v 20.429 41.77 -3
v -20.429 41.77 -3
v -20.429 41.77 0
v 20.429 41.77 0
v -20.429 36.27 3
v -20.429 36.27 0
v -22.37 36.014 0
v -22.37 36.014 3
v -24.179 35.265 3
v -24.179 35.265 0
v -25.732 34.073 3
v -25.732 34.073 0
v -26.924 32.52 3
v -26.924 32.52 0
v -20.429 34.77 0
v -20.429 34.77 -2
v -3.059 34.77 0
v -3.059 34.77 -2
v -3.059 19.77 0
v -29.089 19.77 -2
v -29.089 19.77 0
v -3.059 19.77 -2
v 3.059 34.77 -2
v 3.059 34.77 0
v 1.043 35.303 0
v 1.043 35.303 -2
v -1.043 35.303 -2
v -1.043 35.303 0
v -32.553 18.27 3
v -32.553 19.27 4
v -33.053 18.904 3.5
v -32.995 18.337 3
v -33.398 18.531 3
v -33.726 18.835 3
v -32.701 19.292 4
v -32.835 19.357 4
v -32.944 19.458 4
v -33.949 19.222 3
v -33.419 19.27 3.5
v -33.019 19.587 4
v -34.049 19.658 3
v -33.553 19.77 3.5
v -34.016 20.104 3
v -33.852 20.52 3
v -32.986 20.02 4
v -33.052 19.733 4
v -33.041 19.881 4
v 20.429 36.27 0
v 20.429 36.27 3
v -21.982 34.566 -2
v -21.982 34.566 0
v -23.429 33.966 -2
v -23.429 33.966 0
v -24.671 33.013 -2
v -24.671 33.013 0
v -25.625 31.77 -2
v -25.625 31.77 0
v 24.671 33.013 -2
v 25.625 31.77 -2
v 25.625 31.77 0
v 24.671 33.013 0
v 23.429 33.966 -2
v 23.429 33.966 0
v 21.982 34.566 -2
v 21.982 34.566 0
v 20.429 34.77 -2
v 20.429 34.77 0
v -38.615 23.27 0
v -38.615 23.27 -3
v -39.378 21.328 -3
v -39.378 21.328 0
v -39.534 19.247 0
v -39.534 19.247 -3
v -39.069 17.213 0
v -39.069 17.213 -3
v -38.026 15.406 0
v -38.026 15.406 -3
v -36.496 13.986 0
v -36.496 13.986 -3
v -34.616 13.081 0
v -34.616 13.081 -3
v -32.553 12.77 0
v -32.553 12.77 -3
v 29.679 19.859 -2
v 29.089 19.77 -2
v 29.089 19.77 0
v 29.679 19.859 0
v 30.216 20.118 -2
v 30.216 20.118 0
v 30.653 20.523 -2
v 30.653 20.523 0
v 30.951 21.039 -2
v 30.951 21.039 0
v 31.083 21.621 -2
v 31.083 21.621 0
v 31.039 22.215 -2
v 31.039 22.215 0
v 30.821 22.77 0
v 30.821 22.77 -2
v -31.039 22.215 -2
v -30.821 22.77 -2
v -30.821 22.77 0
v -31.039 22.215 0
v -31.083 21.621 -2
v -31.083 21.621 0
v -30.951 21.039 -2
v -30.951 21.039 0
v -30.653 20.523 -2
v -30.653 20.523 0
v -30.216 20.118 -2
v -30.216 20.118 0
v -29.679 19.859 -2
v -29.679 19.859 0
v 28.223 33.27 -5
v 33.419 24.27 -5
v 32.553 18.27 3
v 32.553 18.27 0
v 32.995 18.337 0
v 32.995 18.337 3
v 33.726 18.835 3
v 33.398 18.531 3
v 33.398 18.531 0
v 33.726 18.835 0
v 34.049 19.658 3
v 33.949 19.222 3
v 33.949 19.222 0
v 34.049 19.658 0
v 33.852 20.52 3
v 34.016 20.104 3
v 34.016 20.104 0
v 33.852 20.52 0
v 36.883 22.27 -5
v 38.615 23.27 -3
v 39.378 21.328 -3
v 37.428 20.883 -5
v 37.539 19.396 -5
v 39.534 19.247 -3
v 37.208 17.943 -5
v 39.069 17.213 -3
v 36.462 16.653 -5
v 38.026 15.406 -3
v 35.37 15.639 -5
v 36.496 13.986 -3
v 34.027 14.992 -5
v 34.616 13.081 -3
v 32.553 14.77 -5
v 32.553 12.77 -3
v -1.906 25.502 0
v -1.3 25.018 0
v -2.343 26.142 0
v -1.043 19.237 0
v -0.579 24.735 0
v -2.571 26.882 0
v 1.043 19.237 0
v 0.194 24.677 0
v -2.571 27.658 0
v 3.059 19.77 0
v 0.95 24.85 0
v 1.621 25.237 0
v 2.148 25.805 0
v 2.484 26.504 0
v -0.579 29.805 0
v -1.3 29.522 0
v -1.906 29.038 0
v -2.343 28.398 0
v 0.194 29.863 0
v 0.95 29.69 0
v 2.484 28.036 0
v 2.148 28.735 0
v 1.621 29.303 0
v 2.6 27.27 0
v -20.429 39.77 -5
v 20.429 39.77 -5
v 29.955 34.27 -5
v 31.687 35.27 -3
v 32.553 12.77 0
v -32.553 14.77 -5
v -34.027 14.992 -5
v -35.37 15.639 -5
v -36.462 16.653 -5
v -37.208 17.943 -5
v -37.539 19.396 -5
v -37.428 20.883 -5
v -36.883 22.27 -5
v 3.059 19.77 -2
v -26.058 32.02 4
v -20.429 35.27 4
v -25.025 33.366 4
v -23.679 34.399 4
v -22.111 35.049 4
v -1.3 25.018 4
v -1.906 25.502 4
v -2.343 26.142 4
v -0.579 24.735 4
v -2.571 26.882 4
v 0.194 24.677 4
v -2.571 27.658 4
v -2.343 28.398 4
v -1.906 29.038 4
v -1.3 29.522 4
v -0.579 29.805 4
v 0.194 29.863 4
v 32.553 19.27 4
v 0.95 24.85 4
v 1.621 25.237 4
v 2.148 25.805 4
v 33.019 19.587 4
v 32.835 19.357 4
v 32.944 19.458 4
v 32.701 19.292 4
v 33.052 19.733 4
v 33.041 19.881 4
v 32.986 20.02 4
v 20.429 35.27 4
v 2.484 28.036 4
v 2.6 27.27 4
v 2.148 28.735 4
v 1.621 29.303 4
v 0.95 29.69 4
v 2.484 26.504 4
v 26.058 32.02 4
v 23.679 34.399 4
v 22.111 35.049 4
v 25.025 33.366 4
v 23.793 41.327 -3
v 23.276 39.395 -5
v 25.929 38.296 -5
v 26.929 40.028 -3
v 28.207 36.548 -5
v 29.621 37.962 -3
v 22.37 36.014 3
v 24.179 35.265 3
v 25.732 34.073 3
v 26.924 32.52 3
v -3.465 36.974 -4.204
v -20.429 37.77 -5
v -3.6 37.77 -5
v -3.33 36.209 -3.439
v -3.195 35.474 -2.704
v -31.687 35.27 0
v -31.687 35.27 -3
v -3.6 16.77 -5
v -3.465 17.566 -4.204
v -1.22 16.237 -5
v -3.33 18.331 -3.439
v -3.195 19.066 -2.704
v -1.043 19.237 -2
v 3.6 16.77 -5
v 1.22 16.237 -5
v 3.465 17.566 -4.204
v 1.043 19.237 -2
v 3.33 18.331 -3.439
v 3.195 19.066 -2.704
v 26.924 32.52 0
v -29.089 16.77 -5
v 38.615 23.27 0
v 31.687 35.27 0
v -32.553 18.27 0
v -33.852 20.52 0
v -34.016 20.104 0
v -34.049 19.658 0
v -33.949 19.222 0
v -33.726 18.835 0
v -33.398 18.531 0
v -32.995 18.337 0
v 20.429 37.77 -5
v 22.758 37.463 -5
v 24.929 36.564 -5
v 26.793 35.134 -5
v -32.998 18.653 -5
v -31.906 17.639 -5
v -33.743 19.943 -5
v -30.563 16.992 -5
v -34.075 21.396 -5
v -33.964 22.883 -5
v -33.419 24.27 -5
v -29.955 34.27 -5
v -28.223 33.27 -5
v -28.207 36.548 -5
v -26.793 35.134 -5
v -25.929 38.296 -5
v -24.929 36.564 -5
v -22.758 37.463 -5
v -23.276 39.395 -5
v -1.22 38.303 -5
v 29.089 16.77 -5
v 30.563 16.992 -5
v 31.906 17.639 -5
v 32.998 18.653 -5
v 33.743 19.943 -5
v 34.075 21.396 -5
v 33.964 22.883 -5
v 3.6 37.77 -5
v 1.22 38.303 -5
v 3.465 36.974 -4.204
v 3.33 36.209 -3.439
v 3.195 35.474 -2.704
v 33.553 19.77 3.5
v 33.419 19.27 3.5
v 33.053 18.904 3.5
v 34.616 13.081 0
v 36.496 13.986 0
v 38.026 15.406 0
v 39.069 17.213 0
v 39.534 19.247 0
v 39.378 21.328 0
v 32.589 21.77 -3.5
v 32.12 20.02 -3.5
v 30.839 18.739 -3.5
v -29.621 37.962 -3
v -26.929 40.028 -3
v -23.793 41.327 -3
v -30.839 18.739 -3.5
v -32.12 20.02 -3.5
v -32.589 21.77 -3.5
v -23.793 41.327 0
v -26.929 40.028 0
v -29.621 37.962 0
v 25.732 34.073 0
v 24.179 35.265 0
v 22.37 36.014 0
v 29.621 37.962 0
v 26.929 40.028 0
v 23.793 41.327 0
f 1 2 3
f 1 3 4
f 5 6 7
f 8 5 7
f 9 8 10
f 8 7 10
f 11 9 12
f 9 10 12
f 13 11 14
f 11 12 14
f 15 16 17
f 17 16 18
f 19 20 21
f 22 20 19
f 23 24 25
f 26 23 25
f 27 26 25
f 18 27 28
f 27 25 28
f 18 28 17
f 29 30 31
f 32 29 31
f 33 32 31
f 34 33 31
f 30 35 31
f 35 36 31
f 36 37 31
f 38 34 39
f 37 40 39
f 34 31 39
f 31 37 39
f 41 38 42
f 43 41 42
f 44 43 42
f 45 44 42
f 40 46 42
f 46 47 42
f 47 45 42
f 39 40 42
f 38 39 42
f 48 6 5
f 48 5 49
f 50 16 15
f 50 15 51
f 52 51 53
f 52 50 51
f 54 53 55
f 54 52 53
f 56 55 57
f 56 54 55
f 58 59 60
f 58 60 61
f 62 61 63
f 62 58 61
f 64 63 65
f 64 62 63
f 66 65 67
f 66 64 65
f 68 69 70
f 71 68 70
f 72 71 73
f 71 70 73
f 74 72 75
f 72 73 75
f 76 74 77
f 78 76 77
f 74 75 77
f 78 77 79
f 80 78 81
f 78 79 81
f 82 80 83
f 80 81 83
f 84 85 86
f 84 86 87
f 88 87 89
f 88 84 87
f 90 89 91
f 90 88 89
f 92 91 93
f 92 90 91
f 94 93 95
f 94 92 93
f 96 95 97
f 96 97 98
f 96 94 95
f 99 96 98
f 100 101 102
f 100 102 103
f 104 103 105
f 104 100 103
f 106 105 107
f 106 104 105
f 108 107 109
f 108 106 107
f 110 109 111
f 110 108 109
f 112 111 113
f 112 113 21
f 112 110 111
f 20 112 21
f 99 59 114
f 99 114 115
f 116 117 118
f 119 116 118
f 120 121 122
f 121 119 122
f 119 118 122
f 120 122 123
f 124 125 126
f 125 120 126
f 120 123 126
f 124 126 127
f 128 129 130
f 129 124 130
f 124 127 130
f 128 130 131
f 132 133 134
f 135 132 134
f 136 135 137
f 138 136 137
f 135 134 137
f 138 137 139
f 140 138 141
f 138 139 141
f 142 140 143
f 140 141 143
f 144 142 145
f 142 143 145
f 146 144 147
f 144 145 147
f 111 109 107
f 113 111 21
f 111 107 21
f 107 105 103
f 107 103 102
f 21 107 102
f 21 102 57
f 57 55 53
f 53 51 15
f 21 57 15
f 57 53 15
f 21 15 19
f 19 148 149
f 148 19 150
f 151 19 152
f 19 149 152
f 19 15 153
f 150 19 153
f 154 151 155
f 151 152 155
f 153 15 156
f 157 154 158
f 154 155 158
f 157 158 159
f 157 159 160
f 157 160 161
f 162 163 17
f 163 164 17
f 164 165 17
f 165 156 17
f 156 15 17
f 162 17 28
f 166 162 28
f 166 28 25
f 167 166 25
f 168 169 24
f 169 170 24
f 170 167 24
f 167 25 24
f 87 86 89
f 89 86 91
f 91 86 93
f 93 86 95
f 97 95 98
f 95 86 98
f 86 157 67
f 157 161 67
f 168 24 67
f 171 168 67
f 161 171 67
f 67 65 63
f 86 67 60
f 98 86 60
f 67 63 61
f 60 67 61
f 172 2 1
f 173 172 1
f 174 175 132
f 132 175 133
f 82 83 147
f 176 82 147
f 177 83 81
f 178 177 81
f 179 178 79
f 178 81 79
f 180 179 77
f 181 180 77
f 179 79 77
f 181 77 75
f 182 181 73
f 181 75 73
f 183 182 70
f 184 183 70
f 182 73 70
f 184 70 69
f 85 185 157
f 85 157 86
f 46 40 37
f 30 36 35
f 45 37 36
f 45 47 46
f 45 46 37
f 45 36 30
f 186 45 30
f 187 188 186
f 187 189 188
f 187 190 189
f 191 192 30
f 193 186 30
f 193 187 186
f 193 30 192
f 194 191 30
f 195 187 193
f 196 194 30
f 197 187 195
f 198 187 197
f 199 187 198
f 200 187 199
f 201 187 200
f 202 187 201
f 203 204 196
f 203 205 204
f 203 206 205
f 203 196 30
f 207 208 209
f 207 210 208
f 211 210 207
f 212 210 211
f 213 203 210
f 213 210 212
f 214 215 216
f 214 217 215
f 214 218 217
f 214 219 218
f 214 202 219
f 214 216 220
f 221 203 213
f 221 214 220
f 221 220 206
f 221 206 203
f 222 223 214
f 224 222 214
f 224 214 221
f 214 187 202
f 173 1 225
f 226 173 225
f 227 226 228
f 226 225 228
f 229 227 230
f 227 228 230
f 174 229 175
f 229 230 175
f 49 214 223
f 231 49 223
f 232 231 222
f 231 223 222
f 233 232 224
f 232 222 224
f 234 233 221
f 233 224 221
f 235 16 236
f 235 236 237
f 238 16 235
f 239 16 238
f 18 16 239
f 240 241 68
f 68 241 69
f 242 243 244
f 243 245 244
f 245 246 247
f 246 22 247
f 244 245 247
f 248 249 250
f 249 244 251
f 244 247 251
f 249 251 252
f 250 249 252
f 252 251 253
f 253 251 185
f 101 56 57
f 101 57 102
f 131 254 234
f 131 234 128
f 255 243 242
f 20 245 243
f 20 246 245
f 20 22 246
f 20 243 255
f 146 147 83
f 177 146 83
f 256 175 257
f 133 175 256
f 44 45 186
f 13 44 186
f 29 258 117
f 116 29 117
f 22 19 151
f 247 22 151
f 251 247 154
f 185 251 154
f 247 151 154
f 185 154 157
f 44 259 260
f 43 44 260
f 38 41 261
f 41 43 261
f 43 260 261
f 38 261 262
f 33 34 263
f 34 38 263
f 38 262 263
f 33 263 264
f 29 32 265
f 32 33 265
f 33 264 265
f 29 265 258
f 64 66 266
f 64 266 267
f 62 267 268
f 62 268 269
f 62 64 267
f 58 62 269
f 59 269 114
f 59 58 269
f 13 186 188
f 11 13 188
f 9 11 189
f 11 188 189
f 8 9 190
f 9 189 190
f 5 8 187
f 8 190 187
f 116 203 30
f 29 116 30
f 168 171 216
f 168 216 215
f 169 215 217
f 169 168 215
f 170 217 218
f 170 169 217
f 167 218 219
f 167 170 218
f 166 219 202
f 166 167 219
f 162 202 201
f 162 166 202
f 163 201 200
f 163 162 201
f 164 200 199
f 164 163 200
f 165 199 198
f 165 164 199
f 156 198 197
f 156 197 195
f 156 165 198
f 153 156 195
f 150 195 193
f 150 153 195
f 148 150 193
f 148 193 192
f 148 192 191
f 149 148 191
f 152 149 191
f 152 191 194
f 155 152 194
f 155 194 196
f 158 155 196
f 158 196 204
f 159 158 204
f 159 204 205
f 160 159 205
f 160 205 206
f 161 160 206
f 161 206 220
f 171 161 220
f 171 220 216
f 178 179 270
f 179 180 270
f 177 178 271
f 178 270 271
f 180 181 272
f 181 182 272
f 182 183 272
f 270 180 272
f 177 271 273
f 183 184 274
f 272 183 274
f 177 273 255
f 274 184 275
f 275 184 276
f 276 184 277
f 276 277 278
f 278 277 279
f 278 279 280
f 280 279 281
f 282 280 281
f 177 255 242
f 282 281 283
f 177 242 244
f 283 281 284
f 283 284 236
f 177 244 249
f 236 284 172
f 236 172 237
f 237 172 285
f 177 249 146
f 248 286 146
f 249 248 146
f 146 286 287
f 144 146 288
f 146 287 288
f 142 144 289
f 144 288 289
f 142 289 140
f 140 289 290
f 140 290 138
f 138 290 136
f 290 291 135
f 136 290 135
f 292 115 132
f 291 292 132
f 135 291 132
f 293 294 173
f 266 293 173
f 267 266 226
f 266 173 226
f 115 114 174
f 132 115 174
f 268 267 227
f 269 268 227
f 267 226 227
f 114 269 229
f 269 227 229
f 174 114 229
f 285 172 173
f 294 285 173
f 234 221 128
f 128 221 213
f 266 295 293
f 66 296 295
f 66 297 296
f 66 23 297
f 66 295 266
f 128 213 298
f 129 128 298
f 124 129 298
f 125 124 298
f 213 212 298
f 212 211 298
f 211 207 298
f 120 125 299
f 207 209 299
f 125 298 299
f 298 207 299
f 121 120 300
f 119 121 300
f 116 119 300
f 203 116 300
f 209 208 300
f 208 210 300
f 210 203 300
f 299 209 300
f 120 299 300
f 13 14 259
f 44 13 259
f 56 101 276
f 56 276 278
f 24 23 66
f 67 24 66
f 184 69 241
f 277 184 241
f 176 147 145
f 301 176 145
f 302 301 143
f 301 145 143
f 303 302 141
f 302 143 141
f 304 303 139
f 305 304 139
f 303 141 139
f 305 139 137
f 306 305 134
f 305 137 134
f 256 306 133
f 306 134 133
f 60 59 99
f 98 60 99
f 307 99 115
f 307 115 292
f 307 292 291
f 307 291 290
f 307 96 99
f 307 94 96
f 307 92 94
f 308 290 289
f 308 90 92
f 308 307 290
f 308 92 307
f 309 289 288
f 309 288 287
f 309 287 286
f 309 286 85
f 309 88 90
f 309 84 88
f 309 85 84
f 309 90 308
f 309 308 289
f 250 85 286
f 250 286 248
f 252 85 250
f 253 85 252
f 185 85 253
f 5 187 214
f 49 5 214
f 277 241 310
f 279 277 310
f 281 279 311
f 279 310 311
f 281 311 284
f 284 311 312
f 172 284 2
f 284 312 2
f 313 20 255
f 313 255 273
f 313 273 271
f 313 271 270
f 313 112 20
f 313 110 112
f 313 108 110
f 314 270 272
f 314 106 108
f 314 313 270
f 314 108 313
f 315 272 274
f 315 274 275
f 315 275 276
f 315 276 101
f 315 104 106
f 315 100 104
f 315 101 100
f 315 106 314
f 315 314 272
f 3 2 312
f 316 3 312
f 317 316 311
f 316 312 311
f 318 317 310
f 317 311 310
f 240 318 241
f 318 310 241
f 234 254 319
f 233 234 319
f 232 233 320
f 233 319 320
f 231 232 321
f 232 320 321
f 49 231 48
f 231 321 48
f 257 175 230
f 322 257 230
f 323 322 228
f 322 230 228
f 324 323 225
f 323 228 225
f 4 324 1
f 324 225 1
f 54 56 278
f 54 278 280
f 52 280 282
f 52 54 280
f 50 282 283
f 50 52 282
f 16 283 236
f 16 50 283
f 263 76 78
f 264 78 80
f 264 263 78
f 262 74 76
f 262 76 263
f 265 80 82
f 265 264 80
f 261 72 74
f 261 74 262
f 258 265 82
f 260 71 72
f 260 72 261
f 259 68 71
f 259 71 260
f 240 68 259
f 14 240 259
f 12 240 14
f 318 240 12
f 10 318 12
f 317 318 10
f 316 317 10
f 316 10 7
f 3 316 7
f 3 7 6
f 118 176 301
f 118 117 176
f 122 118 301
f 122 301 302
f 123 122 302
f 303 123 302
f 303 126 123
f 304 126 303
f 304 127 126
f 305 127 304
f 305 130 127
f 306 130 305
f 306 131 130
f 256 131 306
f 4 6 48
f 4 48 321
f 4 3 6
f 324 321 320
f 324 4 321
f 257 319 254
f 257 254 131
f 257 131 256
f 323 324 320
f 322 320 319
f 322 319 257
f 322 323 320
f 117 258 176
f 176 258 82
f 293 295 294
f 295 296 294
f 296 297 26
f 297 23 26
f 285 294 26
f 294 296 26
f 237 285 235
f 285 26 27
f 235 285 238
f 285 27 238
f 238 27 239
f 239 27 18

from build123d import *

# Parameters (mm, degrees)
SKETCH178_R     = 2.6
PAD045_DEPTH    = 4
SKETCH180_R     = 2.6
PAD046_DEPTH    = 5
SKETCH179_R     = 2.6
POCKET098_DEPTH = 5
SKETCH194_R     = 8.1
POCKET109_DEPTH = 8
CHAMFER075_SIZE = 3
CHAMFER076_SIZE = 2
CHAMFER077_SIZE = 1


with BuildPart() as part:
    # Sketch178 → Pad045 (new body)
    with BuildSketch(Plane.XY):
        with BuildLine():
            Line((-32.5531808711, 18.27), (32.5531808711, 18.27))
            ThreePointArc((32.5531808711, 18.27), (33.8522189768, 19.02), (33.8522189768, 20.52))
            Line((26.9240157465, 32.52), (33.8522189768, 20.52))
            ThreePointArc((26.9240157465, 32.52), (24.1788252181, 35.2651905284), (20.4288252181, 36.27))
            Line((-20.4288252181, 36.27), (20.4288252181, 36.27))
            ThreePointArc((-20.4288252181, 36.27), (-24.1788252181, 35.2651905284), (-26.9240157465, 32.52))
            Line((-26.9240157465, 32.52), (-33.8522189768, 20.52))
            ThreePointArc((-33.8522189768, 20.52), (-33.8522189768, 19.02), (-32.5531808711, 18.27))
        make_face()
        with Locations((0, 27.27)):
            Circle(SKETCH178_R, mode=Mode.SUBTRACT)
    extrude(amount=PAD045_DEPTH)

    # Sketch180 → Pad046 (join)
    with BuildSketch(Plane.XY.offset(-5)):
        with BuildLine():
            Line((-32.5531808711, 12.77), (32.5531808711, 12.77))
            ThreePointArc((32.5531808711, 12.77), (38.6153586976, 16.27), (38.6153586976, 23.27))
            Line((31.6871554673, 35.27), (38.6153586976, 23.27))
            ThreePointArc((31.6871554673, 35.27), (26.9288252181, 40.0283302492), (20.4288252181, 41.77))
            Line((-20.4288252181, 41.77), (20.4288252181, 41.77))
            ThreePointArc((-20.4288252181, 41.77), (-26.9288252181, 40.0283302492), (-31.6871554673, 35.27))
            Line((-31.6871554673, 35.27), (-38.6153586976, 23.27))
            ThreePointArc((-38.6153586976, 23.27), (-38.6153586976, 16.27), (-32.5531808711, 12.77))
        make_face()
        with Locations((0, 27.27)):
            Circle(SKETCH180_R, mode=Mode.SUBTRACT)
    extrude(amount=PAD046_DEPTH)

    # Sketch179 → Pocket098 (cut)
    with BuildSketch(Plane.XY.offset(-5)):
        with BuildLine():
            Line((-29.0890792559, 19.77), (29.0890792559, 19.77))
            ThreePointArc((29.0890792559, 19.77), (30.8211300635, 20.77), (30.8211300635, 22.77))
            Line((25.6249776408, 31.77), (30.8211300635, 22.77))
            ThreePointArc((25.6249776408, 31.77), (23.4288252181, 33.9661524227), (20.4288252181, 34.77))
            Line((-20.4288252181, 34.77), (20.4288252181, 34.77))
            ThreePointArc((-20.4288252181, 34.77), (-23.4288252181, 33.9661524227), (-25.6249776408, 31.77))
            Line((-25.6249776408, 31.77), (-30.8211300635, 22.77))
            ThreePointArc((-30.8211300635, 22.77), (-30.8211300635, 20.77), (-29.0890792559, 19.77))
        make_face()
        with Locations((0, 27.27)):
            Circle(SKETCH179_R, mode=Mode.SUBTRACT)
    extrude(amount=POCKET098_DEPTH, mode=Mode.SUBTRACT)

    # Sketch194 → Pocket109 (cut)
    with BuildSketch(Plane.XY):
        with Locations((0, 27.27)):
            Circle(SKETCH194_R)
    extrude(amount=-POCKET109_DEPTH, mode=Mode.SUBTRACT)

    # Chamfer075
    chamfer075_edges = [part.edges().sort_by_distance(p)[0] for p in [
        (0, 35.37, -5),
        (-11.744118, 34.77, -5),
        (11.744118, 34.77, -5),
        (-23.428825, 33.966152, -5),
        (-28.223054, 27.27, -5),
        (-30.82113, 20.77, -5),
        (-16.074245, 19.77, -5),
        (0, 19.17, -5),
        (16.074245, 19.77, -5),
        (30.82113, 20.77, -5),
        (28.223054, 27.27, -5),
        (23.428825, 33.966152, -5),
    ]]
    chamfer(chamfer075_edges, length=CHAMFER075_SIZE)

    # Chamfer076
    chamfer076_edges = [part.edges().sort_by_distance(p)[0] for p in [
        (0, 41.77, -5),
    ]]
    chamfer(chamfer076_edges, length=CHAMFER076_SIZE)

    # Chamfer077
    chamfer077_edges = [part.edges().sort_by_distance(p)[0] for p in [
        (0, 36.27, 4),
    ]]
    chamfer(chamfer077_edges, length=CHAMFER077_SIZE)


solid = part.part
